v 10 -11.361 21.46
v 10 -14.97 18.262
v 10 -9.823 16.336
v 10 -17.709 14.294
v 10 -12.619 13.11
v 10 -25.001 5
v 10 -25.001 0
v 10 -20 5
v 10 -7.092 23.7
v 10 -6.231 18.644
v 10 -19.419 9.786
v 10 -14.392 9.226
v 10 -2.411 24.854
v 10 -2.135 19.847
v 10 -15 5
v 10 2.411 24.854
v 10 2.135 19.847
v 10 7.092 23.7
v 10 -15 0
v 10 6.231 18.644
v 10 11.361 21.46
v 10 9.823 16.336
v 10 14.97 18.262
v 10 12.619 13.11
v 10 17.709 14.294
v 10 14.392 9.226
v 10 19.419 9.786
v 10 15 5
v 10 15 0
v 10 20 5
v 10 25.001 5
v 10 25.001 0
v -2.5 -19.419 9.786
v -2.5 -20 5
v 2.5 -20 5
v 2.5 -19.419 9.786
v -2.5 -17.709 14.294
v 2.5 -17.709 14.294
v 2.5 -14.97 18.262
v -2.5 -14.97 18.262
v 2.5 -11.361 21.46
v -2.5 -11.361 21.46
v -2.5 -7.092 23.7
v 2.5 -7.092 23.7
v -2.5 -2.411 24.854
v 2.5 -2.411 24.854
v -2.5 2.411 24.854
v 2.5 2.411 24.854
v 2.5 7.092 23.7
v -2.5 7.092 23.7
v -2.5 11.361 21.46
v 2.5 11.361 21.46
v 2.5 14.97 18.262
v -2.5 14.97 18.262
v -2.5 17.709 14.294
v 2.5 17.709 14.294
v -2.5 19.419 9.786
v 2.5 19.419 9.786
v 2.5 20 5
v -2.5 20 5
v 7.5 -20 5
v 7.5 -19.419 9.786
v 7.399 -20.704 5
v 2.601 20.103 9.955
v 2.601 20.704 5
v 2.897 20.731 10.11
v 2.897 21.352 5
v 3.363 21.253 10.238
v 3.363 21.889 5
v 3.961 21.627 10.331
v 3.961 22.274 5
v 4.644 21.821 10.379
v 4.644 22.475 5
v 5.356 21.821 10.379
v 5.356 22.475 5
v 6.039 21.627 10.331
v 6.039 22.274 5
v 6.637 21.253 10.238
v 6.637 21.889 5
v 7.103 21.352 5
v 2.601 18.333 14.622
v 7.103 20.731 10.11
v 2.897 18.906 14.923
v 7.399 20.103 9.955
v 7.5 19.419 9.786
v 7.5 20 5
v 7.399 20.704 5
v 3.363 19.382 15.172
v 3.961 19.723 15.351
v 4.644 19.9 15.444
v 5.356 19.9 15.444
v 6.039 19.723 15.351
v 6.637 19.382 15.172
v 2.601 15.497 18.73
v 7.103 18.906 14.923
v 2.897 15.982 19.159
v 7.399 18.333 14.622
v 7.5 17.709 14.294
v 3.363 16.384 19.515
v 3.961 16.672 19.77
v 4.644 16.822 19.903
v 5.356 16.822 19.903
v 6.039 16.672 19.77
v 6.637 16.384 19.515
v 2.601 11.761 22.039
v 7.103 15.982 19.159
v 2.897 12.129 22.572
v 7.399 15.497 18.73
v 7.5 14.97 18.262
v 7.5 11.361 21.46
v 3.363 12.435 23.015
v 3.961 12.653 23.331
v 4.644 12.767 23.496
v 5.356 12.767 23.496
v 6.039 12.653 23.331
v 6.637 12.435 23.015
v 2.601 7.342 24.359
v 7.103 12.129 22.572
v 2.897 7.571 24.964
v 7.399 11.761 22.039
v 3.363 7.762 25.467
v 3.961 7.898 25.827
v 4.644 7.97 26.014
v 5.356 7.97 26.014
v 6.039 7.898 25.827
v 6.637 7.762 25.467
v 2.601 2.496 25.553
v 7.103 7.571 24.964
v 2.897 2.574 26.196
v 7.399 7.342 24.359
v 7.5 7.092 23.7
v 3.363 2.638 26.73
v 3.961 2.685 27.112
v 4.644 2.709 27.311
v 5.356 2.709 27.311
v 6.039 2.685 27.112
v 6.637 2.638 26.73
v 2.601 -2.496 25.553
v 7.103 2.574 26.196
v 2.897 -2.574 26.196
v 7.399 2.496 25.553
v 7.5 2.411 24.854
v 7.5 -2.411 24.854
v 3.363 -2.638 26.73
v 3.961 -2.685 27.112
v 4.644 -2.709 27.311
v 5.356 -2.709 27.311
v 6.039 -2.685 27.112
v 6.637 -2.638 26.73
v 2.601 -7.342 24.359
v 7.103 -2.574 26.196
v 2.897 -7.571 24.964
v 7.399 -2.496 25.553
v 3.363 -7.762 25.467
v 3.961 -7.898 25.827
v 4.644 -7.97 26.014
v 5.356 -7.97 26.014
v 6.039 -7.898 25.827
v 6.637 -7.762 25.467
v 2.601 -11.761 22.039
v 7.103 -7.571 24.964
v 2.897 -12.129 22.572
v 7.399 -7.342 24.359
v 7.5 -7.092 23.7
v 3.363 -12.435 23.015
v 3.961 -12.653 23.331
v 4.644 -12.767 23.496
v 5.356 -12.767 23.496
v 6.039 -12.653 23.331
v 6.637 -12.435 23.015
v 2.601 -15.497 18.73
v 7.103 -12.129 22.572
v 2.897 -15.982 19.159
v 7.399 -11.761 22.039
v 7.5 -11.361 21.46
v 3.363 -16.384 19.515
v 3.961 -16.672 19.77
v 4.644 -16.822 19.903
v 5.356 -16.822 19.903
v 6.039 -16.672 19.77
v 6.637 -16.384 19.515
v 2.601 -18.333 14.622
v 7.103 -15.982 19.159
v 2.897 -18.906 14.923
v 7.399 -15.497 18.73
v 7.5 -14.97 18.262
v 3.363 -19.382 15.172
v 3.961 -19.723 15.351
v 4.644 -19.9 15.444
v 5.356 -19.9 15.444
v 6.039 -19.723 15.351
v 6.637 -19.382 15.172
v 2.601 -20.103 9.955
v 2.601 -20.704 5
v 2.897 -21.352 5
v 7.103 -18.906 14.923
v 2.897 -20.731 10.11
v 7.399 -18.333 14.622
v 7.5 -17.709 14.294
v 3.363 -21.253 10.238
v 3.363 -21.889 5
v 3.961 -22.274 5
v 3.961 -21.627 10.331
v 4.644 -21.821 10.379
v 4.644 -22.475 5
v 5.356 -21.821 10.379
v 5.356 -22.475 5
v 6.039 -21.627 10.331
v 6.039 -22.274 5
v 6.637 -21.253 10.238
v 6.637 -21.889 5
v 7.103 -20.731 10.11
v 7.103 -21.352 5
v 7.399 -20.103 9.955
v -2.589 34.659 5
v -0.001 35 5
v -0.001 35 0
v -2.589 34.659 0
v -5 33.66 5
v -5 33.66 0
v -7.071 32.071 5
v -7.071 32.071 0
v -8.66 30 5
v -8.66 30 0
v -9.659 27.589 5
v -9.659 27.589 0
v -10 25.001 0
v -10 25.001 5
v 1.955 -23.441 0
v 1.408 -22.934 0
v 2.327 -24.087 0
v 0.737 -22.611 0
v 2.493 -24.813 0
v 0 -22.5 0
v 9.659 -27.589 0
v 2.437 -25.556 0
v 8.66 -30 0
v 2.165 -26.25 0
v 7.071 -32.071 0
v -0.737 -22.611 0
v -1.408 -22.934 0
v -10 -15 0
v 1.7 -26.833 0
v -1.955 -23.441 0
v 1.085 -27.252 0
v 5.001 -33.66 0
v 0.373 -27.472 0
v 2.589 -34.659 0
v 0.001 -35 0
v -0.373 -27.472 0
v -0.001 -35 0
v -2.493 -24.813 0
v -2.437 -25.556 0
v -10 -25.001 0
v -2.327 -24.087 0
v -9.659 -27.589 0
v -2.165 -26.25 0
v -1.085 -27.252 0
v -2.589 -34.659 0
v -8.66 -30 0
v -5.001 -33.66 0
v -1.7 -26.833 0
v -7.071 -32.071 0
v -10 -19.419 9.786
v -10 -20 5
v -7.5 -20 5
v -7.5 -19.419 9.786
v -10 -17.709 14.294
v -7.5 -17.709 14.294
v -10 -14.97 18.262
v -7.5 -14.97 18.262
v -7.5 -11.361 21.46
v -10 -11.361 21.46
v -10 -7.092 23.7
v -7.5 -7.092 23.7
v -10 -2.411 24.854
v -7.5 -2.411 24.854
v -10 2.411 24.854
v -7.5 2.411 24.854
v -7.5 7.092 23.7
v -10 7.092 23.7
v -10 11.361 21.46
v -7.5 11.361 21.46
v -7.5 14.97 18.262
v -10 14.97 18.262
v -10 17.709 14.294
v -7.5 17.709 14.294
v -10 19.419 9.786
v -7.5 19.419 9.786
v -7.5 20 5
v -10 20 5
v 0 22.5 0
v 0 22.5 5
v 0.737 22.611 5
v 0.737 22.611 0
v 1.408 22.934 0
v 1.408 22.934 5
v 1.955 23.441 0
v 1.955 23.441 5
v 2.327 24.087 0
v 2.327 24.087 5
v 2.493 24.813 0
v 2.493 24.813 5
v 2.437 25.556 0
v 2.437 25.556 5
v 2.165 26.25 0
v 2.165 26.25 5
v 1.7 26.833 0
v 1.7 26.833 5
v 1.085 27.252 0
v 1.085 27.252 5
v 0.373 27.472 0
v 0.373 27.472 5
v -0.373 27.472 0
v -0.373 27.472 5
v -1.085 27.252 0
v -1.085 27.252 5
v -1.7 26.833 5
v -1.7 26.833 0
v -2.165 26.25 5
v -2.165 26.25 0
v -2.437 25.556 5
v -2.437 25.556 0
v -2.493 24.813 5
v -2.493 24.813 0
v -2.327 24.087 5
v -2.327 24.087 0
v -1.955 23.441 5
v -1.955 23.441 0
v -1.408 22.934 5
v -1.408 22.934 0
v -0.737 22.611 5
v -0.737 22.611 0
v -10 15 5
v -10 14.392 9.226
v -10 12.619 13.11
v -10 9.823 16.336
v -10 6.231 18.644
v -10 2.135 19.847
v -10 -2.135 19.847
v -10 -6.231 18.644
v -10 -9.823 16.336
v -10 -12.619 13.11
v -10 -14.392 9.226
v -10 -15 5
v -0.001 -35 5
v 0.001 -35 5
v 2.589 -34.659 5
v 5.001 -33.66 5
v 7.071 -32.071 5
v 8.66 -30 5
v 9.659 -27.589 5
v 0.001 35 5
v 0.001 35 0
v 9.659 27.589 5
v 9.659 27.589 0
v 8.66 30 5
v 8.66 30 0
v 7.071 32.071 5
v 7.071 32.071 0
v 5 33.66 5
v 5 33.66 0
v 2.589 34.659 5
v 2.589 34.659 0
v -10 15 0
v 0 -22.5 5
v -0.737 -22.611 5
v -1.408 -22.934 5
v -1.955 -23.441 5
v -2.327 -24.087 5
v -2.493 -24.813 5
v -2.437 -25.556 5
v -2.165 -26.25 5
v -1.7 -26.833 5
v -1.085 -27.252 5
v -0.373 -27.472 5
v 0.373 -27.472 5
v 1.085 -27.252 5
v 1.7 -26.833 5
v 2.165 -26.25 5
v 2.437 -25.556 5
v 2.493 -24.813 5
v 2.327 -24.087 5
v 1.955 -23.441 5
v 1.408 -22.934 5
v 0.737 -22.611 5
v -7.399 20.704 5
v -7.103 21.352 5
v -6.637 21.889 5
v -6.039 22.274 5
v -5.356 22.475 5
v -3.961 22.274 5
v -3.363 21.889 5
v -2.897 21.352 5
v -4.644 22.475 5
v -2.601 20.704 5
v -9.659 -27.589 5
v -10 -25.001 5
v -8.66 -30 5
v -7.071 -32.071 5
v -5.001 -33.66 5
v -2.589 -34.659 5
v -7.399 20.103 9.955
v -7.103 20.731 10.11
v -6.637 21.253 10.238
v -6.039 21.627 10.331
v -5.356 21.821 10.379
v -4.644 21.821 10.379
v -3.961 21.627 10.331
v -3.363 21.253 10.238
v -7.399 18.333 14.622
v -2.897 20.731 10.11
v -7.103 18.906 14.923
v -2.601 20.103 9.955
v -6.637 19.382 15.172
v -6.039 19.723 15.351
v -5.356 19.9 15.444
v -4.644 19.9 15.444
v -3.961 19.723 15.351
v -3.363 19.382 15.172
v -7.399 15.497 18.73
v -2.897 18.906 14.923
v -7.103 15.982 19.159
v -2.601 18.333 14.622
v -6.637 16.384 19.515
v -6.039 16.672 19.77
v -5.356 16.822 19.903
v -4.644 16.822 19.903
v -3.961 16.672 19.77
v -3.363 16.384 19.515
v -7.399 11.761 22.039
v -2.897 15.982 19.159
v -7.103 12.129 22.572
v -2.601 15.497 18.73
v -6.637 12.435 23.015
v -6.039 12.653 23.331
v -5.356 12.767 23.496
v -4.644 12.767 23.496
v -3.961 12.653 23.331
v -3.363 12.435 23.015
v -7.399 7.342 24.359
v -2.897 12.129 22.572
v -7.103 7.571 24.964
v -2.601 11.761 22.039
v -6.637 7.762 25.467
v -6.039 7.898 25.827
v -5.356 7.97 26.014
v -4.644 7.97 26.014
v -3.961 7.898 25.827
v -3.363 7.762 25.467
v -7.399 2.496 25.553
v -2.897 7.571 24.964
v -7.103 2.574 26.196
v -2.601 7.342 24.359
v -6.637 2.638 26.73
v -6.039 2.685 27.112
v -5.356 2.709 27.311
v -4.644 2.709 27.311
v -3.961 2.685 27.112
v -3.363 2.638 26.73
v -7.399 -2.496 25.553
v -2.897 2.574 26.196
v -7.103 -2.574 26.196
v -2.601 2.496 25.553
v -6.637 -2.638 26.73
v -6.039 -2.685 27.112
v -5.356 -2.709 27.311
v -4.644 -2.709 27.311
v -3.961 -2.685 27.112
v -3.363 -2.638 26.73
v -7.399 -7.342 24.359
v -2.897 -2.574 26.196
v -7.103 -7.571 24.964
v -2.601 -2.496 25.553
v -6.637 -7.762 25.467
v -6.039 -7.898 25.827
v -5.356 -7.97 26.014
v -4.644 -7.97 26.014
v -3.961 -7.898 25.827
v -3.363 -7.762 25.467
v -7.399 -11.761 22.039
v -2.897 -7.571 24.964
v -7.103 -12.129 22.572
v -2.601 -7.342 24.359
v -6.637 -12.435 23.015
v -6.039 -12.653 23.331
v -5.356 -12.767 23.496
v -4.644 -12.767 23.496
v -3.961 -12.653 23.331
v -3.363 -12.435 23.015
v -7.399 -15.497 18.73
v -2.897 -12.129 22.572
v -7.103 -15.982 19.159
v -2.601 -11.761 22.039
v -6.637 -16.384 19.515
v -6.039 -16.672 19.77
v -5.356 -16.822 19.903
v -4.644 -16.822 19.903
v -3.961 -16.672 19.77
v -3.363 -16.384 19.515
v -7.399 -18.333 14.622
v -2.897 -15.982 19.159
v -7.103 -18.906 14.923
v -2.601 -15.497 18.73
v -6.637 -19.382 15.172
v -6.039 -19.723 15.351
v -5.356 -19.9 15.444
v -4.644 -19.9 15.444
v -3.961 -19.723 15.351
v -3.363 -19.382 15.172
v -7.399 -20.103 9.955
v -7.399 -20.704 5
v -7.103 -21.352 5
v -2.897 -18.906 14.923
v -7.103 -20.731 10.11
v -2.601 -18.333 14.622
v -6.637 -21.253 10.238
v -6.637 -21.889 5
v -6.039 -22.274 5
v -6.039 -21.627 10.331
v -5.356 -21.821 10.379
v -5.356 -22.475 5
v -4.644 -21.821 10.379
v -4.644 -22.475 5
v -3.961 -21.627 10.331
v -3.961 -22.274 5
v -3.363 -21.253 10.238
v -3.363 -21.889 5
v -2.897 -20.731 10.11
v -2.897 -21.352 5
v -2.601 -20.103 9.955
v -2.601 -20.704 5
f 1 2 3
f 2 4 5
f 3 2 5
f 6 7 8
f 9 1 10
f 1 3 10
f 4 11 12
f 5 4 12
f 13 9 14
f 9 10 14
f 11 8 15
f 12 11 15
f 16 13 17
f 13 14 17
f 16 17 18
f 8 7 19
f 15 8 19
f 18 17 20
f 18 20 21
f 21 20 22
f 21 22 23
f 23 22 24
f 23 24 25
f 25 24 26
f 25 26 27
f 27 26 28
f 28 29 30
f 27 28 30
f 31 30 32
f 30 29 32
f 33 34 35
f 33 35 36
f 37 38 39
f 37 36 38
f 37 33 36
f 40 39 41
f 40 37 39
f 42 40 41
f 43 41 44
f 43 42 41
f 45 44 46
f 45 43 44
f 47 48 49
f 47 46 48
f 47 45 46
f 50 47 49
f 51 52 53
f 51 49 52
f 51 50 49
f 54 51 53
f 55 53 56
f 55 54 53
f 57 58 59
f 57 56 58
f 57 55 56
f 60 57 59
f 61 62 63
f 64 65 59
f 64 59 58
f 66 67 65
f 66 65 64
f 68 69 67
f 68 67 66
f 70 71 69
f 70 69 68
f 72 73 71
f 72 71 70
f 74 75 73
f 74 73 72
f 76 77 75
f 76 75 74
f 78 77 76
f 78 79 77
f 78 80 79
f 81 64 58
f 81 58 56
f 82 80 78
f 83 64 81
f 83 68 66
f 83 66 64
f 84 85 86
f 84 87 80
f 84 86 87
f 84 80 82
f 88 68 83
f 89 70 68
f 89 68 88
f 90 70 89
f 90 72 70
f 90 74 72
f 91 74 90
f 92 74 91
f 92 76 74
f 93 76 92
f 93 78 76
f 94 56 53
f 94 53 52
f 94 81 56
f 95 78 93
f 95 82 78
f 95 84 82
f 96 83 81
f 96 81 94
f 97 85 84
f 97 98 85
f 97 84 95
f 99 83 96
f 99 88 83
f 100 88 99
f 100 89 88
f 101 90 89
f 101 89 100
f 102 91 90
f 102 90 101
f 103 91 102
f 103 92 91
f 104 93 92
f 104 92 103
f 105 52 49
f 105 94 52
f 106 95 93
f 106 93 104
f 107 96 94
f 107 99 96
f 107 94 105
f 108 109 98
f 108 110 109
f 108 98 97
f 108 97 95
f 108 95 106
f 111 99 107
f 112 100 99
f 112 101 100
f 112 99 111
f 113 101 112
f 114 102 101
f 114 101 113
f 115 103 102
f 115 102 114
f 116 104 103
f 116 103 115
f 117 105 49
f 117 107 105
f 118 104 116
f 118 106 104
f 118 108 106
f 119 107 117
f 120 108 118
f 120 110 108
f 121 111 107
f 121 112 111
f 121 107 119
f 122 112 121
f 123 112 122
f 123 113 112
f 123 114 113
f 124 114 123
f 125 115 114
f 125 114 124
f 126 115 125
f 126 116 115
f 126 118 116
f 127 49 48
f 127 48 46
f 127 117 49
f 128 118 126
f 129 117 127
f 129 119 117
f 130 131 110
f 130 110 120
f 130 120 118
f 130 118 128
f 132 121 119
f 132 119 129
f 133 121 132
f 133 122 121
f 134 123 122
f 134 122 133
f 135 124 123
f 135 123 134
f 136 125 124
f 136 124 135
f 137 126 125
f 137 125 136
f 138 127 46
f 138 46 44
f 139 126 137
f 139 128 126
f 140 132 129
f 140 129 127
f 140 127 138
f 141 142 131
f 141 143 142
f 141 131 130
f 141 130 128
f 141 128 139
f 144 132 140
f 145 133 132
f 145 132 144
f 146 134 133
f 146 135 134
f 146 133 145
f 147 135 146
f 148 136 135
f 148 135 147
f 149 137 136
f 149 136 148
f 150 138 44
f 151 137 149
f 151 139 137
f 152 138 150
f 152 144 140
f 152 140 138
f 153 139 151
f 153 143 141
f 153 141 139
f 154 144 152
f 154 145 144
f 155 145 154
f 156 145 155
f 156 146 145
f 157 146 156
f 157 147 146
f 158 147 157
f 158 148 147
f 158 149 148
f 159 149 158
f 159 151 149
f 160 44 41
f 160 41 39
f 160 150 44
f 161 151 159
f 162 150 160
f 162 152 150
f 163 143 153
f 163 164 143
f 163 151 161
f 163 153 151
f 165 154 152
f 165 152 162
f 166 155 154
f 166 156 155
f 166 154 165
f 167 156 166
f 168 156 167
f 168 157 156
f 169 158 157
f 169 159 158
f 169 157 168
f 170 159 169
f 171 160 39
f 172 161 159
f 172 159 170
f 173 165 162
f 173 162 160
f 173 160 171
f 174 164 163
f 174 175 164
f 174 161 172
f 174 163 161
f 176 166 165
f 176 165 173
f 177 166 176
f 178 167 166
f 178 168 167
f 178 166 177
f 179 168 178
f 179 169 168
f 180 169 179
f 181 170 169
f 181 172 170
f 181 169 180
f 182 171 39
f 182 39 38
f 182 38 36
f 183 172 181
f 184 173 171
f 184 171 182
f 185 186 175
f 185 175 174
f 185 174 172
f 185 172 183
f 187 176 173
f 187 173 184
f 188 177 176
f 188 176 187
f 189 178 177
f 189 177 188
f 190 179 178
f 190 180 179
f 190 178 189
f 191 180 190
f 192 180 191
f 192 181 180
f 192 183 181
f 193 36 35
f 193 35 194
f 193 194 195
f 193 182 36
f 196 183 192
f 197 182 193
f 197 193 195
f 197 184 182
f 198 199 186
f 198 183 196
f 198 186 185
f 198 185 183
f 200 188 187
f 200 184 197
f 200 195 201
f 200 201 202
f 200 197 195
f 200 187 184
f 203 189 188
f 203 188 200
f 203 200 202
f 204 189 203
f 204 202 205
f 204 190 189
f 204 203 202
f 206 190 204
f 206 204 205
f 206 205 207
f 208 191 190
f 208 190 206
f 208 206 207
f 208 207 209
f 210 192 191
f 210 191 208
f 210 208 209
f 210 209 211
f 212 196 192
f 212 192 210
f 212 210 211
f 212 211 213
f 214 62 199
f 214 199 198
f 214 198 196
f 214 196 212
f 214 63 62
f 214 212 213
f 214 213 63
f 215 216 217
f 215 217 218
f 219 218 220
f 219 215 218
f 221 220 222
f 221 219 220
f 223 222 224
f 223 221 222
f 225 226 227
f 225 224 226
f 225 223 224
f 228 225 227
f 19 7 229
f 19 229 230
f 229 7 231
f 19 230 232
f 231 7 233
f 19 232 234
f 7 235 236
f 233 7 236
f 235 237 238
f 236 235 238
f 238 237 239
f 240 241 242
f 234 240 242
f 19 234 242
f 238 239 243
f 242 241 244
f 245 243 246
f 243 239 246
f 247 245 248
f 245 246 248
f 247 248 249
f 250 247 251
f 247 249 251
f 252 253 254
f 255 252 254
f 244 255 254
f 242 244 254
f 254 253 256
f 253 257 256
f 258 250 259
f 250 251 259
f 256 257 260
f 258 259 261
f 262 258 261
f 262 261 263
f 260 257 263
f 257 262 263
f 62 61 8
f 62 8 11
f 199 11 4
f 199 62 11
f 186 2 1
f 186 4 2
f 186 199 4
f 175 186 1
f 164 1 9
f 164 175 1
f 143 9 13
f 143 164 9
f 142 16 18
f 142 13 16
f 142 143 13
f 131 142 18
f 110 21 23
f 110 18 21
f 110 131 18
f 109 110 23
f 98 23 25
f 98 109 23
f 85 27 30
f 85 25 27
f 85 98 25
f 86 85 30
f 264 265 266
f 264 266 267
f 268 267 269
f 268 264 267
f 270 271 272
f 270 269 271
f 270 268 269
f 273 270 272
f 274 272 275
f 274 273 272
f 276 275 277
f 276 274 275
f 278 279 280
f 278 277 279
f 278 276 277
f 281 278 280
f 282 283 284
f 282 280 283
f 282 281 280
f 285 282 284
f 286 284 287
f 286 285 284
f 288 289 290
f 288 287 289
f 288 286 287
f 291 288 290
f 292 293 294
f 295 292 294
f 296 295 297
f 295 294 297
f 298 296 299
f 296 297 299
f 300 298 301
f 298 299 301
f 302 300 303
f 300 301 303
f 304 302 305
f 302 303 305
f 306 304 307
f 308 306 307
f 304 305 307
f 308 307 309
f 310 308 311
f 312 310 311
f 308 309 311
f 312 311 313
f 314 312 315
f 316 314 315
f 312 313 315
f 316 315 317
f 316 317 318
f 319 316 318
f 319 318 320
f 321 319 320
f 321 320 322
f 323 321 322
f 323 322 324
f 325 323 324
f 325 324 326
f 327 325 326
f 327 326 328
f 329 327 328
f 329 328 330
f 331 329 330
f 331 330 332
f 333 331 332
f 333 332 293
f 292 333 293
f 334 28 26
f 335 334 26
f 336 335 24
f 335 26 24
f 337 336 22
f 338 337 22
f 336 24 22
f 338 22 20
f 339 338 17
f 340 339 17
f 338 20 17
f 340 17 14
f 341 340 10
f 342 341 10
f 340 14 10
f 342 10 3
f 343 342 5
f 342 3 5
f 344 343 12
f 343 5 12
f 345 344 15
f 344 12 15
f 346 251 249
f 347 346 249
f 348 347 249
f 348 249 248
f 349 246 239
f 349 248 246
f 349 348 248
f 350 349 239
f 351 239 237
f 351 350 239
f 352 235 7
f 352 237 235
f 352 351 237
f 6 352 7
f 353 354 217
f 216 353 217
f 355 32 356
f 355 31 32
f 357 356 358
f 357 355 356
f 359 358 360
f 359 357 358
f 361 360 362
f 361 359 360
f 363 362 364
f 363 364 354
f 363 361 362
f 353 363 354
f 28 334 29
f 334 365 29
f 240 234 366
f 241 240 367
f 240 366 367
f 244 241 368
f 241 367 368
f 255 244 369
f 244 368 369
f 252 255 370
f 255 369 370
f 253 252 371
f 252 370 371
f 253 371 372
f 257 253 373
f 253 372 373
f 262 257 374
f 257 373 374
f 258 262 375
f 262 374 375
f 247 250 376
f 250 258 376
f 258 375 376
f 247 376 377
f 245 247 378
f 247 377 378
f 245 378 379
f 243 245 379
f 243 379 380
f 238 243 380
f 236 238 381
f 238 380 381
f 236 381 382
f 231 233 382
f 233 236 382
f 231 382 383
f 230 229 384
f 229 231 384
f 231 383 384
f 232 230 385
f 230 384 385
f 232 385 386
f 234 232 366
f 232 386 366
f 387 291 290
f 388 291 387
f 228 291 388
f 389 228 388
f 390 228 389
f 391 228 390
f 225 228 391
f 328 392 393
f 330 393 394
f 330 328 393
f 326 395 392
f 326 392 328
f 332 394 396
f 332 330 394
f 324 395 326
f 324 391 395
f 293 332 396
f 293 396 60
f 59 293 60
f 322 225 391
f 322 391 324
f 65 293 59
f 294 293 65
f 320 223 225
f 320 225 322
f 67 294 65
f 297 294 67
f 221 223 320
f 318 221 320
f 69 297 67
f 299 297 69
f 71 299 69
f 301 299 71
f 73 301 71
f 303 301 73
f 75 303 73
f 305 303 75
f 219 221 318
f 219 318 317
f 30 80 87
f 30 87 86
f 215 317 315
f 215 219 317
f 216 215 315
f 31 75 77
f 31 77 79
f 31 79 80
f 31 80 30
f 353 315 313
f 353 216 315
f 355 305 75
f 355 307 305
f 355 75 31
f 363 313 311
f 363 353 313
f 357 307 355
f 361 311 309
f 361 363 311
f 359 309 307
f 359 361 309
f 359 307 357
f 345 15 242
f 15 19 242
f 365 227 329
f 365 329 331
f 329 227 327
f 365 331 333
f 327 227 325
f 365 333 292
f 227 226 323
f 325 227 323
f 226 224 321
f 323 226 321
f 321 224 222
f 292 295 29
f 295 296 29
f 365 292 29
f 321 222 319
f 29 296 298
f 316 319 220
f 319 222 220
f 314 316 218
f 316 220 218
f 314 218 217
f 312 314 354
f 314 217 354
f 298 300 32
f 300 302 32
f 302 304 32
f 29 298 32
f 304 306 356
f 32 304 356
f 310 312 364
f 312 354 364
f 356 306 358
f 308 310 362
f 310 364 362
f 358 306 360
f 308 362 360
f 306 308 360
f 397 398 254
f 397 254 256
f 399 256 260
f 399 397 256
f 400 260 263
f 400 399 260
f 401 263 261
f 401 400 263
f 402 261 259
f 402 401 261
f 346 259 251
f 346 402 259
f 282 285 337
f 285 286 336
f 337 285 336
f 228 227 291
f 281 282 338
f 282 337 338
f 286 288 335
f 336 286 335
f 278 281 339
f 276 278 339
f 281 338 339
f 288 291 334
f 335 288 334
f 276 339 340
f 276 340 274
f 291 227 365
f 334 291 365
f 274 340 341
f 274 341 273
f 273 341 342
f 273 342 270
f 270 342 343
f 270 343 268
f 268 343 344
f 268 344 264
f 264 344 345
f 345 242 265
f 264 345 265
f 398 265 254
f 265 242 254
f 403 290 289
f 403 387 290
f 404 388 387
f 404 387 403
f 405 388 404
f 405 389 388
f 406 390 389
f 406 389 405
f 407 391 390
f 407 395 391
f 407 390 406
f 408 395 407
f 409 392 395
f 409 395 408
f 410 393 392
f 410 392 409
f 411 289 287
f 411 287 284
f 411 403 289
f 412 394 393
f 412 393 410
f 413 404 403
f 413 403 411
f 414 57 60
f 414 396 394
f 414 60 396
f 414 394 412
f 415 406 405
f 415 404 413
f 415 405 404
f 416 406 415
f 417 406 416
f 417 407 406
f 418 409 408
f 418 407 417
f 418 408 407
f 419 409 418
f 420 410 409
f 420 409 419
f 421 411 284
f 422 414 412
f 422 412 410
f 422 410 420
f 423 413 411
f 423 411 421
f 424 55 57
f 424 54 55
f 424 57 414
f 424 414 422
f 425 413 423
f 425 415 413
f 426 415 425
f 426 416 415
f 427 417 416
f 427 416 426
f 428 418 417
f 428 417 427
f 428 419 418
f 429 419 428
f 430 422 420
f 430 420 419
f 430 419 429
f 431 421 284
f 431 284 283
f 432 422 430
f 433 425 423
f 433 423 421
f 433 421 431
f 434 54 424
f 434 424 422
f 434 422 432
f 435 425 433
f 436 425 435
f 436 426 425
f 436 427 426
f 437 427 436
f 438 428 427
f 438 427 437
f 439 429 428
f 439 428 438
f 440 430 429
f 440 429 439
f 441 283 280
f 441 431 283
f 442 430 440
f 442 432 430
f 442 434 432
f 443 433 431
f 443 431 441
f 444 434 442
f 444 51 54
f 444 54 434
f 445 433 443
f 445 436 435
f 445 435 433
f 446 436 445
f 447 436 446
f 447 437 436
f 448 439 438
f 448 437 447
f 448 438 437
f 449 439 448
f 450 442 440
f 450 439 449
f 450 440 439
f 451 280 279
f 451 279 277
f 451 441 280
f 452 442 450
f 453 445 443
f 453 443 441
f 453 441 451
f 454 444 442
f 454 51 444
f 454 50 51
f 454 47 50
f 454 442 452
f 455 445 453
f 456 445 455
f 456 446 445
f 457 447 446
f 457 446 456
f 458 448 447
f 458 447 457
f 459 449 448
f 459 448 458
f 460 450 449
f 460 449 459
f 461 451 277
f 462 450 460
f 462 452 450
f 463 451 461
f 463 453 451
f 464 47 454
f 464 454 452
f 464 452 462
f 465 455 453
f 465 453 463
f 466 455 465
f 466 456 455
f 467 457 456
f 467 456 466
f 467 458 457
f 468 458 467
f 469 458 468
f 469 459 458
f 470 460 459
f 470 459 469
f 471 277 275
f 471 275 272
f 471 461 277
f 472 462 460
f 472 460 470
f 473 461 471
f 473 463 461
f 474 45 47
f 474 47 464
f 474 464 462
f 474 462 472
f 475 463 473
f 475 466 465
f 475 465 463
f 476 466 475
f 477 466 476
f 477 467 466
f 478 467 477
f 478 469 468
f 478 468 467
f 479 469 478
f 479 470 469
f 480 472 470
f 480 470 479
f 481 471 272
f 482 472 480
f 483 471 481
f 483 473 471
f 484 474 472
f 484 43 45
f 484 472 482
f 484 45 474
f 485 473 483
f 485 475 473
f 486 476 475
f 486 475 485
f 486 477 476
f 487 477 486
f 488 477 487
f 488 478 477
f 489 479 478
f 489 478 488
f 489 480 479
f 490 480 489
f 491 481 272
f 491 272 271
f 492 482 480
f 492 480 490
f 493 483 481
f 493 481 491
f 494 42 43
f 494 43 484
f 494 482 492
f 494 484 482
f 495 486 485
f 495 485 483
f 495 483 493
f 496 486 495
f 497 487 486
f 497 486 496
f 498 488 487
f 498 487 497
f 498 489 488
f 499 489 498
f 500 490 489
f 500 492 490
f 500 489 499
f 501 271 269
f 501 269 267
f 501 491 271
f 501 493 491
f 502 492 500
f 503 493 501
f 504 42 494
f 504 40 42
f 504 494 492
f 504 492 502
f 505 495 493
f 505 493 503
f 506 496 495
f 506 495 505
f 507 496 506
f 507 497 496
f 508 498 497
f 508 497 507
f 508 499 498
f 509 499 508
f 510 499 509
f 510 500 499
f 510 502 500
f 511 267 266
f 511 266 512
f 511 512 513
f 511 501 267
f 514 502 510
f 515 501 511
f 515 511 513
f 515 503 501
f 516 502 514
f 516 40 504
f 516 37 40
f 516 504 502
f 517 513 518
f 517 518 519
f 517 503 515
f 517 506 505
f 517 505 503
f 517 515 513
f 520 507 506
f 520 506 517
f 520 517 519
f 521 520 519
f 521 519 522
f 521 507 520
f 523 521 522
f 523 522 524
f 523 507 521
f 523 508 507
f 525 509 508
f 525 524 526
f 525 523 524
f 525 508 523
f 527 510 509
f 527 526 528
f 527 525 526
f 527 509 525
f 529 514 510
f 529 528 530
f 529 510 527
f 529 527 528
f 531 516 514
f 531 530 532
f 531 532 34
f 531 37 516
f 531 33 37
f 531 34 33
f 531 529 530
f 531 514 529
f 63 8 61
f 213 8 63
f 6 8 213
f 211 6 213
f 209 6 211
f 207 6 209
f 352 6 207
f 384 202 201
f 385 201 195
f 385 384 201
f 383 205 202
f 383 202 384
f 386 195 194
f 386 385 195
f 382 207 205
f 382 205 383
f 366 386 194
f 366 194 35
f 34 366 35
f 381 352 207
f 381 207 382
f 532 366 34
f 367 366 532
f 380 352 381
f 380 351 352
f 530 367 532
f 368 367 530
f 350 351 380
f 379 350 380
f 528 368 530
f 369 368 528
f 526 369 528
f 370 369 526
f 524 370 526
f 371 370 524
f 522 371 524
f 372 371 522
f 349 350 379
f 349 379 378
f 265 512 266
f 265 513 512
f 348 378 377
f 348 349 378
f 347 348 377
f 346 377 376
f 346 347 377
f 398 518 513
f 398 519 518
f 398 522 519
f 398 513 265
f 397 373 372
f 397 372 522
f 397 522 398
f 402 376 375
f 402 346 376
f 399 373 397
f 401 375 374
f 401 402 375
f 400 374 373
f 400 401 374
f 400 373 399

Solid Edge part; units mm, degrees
sketch "Sketch1" plane through (0, 0, 0) normal (0, 0, 1) x (1, 0, 0)
  line L0 (-10, 15) -> (10, 15)
  line L1 (10, 15) -> (10, 35)
  line L2 (10, 35) -> (-10, 35)
  line L3 (-10, 35) -> (-10, 15)
  dimension "D1" = 20
  dimension "D2" = 20
  dimension "D3" = 15
extrude "Protrusion1" add sketch "Sketch1" along normal blind 5
hole "Hole_1" at (0, 25, 5) direction (0, 0, -1) diameter 5 end up to next
fillet "Round_1" radius 10 2 edges at (10, 35, 2.5) (-10, 35, 2.5)
mirror "Mirror1" about plane through (0, 0, 0) normal (0, 1, 0) of "Protrusion1", "Hole_1"
fillet "Round1" radius 10 2 edges at (10, -35, 2.5) (-10, -35, 2.5)
sketch "Sketch2" plane through (0, 40, 5) normal (0, 0, 1) x (1, 0, 0)
  line L0 (-10, -25) -> (10, -25)
  line L1 (10, -25) -> (10, -20)
  line L2 (10, -20) -> (7.5, -20)
  arc A0 (2.5, -20) -> (7.5, -20) centre (5, -20) cw
  line L3 (2.5, -20) -> (-2.5, -20)
  arc A1 (-7.5, -20) -> (-2.5, -20) centre (-5, -20) cw
  line L4 (-7.5, -20) -> (-10, -20)
  line L5 (-10, -20) -> (-10, -25)
  dimension "D1" = 5
  dimension "D2" = 5
revolve "RevolvedProtrusion_1" add sketch "Sketch2" angle 180 about axis through (0, 0, 5) along (1, 0, 0)
